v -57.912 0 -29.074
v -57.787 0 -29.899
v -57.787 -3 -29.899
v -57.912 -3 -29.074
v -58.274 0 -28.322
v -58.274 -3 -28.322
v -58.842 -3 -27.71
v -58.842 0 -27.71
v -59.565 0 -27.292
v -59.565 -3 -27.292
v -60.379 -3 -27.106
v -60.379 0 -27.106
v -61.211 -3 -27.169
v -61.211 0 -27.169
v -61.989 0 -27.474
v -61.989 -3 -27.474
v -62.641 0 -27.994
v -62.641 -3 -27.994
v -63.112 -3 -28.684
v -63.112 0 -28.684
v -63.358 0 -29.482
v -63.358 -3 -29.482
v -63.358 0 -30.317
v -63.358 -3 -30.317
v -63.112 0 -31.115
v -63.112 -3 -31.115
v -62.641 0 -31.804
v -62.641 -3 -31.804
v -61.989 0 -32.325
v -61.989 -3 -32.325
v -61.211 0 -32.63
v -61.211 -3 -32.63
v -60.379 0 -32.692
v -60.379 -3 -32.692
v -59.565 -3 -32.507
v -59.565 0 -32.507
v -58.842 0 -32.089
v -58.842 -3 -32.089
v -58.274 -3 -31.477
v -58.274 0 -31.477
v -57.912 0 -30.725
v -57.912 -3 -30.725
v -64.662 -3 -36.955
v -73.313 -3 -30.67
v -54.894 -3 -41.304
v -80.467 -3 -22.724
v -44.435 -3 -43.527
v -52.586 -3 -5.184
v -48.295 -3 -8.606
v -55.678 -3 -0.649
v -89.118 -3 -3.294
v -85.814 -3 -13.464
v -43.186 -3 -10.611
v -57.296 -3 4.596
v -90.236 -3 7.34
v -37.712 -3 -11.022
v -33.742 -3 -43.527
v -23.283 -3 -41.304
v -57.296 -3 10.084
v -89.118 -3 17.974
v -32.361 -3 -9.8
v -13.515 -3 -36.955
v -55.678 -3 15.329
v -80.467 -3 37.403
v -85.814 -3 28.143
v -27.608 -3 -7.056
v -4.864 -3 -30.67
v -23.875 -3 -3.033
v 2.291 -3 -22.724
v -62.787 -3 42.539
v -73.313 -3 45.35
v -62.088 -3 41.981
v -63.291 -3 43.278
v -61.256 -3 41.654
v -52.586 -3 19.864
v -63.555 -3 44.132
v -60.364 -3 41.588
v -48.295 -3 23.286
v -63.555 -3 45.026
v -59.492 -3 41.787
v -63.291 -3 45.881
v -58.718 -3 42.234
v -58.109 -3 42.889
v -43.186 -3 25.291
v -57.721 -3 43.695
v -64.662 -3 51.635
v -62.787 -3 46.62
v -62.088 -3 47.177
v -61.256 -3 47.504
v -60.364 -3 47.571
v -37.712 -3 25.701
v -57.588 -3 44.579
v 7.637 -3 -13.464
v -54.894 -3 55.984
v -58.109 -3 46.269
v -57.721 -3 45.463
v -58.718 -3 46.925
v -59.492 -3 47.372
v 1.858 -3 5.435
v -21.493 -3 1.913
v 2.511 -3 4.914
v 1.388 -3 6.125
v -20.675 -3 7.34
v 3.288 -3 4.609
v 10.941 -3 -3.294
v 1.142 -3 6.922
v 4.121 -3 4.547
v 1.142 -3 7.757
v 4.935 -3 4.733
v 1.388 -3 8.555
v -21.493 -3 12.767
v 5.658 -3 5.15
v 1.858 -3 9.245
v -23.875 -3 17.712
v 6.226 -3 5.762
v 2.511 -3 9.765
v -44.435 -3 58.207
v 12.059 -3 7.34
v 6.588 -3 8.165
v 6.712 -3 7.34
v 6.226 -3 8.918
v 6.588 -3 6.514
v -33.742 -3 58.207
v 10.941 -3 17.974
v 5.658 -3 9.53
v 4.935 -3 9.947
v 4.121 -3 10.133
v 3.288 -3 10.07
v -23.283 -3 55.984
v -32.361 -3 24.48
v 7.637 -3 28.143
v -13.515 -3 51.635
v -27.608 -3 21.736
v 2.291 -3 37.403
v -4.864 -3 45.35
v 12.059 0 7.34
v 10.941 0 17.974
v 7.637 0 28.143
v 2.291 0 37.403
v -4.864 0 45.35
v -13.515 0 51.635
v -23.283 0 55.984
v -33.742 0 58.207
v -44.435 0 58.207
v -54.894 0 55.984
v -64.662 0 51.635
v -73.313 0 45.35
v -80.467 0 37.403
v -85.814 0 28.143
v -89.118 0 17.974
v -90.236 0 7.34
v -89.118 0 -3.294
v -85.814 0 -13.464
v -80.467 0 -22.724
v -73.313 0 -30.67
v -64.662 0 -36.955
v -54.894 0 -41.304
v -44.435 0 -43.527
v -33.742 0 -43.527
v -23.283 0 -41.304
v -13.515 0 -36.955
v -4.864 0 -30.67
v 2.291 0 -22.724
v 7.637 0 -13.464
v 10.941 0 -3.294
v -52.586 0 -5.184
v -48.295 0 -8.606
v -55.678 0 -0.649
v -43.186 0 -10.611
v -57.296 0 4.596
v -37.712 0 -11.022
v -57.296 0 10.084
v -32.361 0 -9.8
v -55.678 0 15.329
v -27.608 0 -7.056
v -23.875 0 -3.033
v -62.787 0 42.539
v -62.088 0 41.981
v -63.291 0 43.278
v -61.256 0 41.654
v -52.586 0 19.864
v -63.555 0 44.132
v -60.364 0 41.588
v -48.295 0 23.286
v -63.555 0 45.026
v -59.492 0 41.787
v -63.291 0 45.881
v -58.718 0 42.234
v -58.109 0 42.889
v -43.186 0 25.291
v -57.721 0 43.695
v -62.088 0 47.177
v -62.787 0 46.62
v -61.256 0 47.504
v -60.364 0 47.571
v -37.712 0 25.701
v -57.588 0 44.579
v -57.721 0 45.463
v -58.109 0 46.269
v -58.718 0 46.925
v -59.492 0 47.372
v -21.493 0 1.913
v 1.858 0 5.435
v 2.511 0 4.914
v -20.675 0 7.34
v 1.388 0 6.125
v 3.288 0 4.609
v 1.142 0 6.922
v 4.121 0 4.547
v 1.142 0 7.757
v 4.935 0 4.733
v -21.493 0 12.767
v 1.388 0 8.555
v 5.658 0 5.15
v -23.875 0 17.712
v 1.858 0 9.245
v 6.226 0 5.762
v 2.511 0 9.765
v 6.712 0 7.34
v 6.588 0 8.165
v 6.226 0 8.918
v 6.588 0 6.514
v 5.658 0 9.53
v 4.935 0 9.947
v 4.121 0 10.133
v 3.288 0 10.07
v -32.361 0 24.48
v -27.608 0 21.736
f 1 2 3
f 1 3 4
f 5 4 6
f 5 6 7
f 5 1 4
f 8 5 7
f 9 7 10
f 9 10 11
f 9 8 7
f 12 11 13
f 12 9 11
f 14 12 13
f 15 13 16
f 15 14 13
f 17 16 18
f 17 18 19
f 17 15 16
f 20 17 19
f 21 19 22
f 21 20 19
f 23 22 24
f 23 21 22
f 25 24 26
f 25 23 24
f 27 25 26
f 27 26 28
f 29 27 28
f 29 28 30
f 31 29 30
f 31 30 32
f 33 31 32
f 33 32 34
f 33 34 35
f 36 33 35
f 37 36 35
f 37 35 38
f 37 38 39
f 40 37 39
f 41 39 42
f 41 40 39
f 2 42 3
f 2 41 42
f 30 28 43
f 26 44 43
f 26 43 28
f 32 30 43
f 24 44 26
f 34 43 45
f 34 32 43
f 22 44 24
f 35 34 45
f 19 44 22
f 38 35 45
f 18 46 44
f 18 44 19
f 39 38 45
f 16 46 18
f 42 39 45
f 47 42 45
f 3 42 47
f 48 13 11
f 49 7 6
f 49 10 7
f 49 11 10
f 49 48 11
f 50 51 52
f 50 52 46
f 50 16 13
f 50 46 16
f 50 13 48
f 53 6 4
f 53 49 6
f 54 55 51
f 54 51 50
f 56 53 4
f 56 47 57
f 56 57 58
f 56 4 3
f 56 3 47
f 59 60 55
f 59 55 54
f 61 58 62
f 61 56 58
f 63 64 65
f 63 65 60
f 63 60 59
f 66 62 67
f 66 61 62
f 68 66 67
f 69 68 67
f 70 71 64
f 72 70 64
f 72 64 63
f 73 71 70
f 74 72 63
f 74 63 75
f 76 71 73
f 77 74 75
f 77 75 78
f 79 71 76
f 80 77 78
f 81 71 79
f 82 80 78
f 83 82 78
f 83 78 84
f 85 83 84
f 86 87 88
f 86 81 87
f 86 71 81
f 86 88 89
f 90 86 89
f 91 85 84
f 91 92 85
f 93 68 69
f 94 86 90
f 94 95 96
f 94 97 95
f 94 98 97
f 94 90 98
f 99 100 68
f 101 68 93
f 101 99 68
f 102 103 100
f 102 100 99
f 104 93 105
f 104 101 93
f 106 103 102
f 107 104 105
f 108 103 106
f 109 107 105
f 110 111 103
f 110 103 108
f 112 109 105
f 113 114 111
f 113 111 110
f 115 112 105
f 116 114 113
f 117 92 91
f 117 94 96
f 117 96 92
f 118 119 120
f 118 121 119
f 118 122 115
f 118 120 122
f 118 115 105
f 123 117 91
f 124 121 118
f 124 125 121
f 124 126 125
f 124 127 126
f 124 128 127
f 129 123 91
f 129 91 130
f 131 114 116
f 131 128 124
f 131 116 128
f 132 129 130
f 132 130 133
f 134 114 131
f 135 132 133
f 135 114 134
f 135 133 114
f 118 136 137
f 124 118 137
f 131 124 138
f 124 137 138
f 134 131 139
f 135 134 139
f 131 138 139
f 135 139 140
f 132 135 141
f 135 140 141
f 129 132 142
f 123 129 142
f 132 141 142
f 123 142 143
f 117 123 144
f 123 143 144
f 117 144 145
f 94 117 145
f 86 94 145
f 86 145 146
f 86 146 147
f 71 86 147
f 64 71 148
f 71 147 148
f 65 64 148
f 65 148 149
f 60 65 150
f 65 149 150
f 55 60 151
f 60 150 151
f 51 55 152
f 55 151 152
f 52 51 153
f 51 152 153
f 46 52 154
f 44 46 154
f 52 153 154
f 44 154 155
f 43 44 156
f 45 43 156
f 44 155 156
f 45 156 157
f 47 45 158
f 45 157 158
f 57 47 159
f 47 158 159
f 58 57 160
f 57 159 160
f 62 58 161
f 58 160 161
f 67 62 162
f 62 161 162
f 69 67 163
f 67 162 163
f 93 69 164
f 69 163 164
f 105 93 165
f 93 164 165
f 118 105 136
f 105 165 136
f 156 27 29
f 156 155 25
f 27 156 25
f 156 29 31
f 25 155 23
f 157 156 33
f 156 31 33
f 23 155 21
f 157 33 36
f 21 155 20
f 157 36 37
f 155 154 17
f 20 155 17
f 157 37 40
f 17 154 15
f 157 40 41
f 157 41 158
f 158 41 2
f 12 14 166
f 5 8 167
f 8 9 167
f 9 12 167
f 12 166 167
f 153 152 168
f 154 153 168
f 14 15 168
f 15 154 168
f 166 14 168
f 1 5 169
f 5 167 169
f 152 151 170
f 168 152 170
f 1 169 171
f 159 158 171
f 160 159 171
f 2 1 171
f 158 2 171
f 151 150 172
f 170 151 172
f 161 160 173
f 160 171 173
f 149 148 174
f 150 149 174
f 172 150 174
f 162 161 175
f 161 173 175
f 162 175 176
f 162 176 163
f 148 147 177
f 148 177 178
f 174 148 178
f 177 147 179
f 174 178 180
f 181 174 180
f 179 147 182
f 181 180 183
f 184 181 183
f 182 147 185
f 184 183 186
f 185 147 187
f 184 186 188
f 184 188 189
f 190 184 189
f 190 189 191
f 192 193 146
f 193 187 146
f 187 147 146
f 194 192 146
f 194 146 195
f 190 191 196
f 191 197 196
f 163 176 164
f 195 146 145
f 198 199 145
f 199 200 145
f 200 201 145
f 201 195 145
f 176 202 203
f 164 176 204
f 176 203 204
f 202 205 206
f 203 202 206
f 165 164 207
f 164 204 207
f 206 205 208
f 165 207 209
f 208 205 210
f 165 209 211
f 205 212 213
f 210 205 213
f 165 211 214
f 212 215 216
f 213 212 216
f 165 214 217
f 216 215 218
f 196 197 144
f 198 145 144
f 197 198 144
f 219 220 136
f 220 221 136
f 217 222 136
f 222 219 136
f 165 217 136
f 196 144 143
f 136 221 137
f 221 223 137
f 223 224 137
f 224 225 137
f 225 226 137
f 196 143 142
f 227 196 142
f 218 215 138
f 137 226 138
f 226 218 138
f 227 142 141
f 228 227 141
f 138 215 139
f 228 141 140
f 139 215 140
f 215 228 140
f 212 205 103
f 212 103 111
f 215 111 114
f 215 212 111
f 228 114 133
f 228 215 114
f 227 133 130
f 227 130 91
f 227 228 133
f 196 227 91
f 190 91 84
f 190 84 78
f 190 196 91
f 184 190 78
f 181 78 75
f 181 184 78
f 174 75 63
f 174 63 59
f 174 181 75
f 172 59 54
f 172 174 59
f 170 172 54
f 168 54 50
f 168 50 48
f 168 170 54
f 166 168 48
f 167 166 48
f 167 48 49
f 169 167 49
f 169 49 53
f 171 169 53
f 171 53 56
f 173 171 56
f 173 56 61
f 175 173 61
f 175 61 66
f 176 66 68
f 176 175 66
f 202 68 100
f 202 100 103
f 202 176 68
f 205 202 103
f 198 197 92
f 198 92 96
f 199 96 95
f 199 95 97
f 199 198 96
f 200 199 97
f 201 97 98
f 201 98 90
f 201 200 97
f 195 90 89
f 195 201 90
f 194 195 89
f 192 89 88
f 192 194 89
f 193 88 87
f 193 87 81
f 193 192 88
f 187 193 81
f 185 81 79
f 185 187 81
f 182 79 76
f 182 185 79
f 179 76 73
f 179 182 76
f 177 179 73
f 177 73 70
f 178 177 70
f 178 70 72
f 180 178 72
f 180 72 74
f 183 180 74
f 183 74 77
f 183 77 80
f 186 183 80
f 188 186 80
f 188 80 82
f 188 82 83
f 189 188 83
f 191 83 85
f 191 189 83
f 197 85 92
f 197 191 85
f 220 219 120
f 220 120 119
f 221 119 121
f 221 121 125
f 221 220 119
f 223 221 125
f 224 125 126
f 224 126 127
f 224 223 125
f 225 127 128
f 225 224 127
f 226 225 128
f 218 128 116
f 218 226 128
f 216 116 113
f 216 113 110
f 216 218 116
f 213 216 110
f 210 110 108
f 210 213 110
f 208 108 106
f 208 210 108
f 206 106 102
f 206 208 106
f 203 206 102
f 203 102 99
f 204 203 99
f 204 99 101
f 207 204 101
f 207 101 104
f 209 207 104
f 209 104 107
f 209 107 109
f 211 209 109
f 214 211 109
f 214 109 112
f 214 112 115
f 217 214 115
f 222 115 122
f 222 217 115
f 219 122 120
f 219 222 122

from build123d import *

# Parameters (mm, degrees)
F0_R     = 51.147265
F0_R_2   = 2.800835
F0_R_3   = 3
F0_R_4   = 18.413015
F1_DEPTH = 3


with BuildPart() as f1:
    # F0 (on Front) → F1 (new body)
    with BuildSketch(Plane.XZ):
        with Locations((-39.088421, 7.339887)):
            Circle(F0_R)
        with Locations((-60.588101, -29.89939)):
            Circle(F0_R_2, mode=Mode.SUBTRACT)
        with Locations((-60.588101, 44.579164)):
            Circle(F0_R_3, mode=Mode.SUBTRACT)
        with Locations((-39.088421, 7.339887)):
            Circle(F0_R_4, mode=Mode.SUBTRACT)
        with Locations((3.911579, 7.339887)):
            Circle(F0_R_2, mode=Mode.SUBTRACT)
    extrude(amount=F1_DEPTH)


solid = f1.part
